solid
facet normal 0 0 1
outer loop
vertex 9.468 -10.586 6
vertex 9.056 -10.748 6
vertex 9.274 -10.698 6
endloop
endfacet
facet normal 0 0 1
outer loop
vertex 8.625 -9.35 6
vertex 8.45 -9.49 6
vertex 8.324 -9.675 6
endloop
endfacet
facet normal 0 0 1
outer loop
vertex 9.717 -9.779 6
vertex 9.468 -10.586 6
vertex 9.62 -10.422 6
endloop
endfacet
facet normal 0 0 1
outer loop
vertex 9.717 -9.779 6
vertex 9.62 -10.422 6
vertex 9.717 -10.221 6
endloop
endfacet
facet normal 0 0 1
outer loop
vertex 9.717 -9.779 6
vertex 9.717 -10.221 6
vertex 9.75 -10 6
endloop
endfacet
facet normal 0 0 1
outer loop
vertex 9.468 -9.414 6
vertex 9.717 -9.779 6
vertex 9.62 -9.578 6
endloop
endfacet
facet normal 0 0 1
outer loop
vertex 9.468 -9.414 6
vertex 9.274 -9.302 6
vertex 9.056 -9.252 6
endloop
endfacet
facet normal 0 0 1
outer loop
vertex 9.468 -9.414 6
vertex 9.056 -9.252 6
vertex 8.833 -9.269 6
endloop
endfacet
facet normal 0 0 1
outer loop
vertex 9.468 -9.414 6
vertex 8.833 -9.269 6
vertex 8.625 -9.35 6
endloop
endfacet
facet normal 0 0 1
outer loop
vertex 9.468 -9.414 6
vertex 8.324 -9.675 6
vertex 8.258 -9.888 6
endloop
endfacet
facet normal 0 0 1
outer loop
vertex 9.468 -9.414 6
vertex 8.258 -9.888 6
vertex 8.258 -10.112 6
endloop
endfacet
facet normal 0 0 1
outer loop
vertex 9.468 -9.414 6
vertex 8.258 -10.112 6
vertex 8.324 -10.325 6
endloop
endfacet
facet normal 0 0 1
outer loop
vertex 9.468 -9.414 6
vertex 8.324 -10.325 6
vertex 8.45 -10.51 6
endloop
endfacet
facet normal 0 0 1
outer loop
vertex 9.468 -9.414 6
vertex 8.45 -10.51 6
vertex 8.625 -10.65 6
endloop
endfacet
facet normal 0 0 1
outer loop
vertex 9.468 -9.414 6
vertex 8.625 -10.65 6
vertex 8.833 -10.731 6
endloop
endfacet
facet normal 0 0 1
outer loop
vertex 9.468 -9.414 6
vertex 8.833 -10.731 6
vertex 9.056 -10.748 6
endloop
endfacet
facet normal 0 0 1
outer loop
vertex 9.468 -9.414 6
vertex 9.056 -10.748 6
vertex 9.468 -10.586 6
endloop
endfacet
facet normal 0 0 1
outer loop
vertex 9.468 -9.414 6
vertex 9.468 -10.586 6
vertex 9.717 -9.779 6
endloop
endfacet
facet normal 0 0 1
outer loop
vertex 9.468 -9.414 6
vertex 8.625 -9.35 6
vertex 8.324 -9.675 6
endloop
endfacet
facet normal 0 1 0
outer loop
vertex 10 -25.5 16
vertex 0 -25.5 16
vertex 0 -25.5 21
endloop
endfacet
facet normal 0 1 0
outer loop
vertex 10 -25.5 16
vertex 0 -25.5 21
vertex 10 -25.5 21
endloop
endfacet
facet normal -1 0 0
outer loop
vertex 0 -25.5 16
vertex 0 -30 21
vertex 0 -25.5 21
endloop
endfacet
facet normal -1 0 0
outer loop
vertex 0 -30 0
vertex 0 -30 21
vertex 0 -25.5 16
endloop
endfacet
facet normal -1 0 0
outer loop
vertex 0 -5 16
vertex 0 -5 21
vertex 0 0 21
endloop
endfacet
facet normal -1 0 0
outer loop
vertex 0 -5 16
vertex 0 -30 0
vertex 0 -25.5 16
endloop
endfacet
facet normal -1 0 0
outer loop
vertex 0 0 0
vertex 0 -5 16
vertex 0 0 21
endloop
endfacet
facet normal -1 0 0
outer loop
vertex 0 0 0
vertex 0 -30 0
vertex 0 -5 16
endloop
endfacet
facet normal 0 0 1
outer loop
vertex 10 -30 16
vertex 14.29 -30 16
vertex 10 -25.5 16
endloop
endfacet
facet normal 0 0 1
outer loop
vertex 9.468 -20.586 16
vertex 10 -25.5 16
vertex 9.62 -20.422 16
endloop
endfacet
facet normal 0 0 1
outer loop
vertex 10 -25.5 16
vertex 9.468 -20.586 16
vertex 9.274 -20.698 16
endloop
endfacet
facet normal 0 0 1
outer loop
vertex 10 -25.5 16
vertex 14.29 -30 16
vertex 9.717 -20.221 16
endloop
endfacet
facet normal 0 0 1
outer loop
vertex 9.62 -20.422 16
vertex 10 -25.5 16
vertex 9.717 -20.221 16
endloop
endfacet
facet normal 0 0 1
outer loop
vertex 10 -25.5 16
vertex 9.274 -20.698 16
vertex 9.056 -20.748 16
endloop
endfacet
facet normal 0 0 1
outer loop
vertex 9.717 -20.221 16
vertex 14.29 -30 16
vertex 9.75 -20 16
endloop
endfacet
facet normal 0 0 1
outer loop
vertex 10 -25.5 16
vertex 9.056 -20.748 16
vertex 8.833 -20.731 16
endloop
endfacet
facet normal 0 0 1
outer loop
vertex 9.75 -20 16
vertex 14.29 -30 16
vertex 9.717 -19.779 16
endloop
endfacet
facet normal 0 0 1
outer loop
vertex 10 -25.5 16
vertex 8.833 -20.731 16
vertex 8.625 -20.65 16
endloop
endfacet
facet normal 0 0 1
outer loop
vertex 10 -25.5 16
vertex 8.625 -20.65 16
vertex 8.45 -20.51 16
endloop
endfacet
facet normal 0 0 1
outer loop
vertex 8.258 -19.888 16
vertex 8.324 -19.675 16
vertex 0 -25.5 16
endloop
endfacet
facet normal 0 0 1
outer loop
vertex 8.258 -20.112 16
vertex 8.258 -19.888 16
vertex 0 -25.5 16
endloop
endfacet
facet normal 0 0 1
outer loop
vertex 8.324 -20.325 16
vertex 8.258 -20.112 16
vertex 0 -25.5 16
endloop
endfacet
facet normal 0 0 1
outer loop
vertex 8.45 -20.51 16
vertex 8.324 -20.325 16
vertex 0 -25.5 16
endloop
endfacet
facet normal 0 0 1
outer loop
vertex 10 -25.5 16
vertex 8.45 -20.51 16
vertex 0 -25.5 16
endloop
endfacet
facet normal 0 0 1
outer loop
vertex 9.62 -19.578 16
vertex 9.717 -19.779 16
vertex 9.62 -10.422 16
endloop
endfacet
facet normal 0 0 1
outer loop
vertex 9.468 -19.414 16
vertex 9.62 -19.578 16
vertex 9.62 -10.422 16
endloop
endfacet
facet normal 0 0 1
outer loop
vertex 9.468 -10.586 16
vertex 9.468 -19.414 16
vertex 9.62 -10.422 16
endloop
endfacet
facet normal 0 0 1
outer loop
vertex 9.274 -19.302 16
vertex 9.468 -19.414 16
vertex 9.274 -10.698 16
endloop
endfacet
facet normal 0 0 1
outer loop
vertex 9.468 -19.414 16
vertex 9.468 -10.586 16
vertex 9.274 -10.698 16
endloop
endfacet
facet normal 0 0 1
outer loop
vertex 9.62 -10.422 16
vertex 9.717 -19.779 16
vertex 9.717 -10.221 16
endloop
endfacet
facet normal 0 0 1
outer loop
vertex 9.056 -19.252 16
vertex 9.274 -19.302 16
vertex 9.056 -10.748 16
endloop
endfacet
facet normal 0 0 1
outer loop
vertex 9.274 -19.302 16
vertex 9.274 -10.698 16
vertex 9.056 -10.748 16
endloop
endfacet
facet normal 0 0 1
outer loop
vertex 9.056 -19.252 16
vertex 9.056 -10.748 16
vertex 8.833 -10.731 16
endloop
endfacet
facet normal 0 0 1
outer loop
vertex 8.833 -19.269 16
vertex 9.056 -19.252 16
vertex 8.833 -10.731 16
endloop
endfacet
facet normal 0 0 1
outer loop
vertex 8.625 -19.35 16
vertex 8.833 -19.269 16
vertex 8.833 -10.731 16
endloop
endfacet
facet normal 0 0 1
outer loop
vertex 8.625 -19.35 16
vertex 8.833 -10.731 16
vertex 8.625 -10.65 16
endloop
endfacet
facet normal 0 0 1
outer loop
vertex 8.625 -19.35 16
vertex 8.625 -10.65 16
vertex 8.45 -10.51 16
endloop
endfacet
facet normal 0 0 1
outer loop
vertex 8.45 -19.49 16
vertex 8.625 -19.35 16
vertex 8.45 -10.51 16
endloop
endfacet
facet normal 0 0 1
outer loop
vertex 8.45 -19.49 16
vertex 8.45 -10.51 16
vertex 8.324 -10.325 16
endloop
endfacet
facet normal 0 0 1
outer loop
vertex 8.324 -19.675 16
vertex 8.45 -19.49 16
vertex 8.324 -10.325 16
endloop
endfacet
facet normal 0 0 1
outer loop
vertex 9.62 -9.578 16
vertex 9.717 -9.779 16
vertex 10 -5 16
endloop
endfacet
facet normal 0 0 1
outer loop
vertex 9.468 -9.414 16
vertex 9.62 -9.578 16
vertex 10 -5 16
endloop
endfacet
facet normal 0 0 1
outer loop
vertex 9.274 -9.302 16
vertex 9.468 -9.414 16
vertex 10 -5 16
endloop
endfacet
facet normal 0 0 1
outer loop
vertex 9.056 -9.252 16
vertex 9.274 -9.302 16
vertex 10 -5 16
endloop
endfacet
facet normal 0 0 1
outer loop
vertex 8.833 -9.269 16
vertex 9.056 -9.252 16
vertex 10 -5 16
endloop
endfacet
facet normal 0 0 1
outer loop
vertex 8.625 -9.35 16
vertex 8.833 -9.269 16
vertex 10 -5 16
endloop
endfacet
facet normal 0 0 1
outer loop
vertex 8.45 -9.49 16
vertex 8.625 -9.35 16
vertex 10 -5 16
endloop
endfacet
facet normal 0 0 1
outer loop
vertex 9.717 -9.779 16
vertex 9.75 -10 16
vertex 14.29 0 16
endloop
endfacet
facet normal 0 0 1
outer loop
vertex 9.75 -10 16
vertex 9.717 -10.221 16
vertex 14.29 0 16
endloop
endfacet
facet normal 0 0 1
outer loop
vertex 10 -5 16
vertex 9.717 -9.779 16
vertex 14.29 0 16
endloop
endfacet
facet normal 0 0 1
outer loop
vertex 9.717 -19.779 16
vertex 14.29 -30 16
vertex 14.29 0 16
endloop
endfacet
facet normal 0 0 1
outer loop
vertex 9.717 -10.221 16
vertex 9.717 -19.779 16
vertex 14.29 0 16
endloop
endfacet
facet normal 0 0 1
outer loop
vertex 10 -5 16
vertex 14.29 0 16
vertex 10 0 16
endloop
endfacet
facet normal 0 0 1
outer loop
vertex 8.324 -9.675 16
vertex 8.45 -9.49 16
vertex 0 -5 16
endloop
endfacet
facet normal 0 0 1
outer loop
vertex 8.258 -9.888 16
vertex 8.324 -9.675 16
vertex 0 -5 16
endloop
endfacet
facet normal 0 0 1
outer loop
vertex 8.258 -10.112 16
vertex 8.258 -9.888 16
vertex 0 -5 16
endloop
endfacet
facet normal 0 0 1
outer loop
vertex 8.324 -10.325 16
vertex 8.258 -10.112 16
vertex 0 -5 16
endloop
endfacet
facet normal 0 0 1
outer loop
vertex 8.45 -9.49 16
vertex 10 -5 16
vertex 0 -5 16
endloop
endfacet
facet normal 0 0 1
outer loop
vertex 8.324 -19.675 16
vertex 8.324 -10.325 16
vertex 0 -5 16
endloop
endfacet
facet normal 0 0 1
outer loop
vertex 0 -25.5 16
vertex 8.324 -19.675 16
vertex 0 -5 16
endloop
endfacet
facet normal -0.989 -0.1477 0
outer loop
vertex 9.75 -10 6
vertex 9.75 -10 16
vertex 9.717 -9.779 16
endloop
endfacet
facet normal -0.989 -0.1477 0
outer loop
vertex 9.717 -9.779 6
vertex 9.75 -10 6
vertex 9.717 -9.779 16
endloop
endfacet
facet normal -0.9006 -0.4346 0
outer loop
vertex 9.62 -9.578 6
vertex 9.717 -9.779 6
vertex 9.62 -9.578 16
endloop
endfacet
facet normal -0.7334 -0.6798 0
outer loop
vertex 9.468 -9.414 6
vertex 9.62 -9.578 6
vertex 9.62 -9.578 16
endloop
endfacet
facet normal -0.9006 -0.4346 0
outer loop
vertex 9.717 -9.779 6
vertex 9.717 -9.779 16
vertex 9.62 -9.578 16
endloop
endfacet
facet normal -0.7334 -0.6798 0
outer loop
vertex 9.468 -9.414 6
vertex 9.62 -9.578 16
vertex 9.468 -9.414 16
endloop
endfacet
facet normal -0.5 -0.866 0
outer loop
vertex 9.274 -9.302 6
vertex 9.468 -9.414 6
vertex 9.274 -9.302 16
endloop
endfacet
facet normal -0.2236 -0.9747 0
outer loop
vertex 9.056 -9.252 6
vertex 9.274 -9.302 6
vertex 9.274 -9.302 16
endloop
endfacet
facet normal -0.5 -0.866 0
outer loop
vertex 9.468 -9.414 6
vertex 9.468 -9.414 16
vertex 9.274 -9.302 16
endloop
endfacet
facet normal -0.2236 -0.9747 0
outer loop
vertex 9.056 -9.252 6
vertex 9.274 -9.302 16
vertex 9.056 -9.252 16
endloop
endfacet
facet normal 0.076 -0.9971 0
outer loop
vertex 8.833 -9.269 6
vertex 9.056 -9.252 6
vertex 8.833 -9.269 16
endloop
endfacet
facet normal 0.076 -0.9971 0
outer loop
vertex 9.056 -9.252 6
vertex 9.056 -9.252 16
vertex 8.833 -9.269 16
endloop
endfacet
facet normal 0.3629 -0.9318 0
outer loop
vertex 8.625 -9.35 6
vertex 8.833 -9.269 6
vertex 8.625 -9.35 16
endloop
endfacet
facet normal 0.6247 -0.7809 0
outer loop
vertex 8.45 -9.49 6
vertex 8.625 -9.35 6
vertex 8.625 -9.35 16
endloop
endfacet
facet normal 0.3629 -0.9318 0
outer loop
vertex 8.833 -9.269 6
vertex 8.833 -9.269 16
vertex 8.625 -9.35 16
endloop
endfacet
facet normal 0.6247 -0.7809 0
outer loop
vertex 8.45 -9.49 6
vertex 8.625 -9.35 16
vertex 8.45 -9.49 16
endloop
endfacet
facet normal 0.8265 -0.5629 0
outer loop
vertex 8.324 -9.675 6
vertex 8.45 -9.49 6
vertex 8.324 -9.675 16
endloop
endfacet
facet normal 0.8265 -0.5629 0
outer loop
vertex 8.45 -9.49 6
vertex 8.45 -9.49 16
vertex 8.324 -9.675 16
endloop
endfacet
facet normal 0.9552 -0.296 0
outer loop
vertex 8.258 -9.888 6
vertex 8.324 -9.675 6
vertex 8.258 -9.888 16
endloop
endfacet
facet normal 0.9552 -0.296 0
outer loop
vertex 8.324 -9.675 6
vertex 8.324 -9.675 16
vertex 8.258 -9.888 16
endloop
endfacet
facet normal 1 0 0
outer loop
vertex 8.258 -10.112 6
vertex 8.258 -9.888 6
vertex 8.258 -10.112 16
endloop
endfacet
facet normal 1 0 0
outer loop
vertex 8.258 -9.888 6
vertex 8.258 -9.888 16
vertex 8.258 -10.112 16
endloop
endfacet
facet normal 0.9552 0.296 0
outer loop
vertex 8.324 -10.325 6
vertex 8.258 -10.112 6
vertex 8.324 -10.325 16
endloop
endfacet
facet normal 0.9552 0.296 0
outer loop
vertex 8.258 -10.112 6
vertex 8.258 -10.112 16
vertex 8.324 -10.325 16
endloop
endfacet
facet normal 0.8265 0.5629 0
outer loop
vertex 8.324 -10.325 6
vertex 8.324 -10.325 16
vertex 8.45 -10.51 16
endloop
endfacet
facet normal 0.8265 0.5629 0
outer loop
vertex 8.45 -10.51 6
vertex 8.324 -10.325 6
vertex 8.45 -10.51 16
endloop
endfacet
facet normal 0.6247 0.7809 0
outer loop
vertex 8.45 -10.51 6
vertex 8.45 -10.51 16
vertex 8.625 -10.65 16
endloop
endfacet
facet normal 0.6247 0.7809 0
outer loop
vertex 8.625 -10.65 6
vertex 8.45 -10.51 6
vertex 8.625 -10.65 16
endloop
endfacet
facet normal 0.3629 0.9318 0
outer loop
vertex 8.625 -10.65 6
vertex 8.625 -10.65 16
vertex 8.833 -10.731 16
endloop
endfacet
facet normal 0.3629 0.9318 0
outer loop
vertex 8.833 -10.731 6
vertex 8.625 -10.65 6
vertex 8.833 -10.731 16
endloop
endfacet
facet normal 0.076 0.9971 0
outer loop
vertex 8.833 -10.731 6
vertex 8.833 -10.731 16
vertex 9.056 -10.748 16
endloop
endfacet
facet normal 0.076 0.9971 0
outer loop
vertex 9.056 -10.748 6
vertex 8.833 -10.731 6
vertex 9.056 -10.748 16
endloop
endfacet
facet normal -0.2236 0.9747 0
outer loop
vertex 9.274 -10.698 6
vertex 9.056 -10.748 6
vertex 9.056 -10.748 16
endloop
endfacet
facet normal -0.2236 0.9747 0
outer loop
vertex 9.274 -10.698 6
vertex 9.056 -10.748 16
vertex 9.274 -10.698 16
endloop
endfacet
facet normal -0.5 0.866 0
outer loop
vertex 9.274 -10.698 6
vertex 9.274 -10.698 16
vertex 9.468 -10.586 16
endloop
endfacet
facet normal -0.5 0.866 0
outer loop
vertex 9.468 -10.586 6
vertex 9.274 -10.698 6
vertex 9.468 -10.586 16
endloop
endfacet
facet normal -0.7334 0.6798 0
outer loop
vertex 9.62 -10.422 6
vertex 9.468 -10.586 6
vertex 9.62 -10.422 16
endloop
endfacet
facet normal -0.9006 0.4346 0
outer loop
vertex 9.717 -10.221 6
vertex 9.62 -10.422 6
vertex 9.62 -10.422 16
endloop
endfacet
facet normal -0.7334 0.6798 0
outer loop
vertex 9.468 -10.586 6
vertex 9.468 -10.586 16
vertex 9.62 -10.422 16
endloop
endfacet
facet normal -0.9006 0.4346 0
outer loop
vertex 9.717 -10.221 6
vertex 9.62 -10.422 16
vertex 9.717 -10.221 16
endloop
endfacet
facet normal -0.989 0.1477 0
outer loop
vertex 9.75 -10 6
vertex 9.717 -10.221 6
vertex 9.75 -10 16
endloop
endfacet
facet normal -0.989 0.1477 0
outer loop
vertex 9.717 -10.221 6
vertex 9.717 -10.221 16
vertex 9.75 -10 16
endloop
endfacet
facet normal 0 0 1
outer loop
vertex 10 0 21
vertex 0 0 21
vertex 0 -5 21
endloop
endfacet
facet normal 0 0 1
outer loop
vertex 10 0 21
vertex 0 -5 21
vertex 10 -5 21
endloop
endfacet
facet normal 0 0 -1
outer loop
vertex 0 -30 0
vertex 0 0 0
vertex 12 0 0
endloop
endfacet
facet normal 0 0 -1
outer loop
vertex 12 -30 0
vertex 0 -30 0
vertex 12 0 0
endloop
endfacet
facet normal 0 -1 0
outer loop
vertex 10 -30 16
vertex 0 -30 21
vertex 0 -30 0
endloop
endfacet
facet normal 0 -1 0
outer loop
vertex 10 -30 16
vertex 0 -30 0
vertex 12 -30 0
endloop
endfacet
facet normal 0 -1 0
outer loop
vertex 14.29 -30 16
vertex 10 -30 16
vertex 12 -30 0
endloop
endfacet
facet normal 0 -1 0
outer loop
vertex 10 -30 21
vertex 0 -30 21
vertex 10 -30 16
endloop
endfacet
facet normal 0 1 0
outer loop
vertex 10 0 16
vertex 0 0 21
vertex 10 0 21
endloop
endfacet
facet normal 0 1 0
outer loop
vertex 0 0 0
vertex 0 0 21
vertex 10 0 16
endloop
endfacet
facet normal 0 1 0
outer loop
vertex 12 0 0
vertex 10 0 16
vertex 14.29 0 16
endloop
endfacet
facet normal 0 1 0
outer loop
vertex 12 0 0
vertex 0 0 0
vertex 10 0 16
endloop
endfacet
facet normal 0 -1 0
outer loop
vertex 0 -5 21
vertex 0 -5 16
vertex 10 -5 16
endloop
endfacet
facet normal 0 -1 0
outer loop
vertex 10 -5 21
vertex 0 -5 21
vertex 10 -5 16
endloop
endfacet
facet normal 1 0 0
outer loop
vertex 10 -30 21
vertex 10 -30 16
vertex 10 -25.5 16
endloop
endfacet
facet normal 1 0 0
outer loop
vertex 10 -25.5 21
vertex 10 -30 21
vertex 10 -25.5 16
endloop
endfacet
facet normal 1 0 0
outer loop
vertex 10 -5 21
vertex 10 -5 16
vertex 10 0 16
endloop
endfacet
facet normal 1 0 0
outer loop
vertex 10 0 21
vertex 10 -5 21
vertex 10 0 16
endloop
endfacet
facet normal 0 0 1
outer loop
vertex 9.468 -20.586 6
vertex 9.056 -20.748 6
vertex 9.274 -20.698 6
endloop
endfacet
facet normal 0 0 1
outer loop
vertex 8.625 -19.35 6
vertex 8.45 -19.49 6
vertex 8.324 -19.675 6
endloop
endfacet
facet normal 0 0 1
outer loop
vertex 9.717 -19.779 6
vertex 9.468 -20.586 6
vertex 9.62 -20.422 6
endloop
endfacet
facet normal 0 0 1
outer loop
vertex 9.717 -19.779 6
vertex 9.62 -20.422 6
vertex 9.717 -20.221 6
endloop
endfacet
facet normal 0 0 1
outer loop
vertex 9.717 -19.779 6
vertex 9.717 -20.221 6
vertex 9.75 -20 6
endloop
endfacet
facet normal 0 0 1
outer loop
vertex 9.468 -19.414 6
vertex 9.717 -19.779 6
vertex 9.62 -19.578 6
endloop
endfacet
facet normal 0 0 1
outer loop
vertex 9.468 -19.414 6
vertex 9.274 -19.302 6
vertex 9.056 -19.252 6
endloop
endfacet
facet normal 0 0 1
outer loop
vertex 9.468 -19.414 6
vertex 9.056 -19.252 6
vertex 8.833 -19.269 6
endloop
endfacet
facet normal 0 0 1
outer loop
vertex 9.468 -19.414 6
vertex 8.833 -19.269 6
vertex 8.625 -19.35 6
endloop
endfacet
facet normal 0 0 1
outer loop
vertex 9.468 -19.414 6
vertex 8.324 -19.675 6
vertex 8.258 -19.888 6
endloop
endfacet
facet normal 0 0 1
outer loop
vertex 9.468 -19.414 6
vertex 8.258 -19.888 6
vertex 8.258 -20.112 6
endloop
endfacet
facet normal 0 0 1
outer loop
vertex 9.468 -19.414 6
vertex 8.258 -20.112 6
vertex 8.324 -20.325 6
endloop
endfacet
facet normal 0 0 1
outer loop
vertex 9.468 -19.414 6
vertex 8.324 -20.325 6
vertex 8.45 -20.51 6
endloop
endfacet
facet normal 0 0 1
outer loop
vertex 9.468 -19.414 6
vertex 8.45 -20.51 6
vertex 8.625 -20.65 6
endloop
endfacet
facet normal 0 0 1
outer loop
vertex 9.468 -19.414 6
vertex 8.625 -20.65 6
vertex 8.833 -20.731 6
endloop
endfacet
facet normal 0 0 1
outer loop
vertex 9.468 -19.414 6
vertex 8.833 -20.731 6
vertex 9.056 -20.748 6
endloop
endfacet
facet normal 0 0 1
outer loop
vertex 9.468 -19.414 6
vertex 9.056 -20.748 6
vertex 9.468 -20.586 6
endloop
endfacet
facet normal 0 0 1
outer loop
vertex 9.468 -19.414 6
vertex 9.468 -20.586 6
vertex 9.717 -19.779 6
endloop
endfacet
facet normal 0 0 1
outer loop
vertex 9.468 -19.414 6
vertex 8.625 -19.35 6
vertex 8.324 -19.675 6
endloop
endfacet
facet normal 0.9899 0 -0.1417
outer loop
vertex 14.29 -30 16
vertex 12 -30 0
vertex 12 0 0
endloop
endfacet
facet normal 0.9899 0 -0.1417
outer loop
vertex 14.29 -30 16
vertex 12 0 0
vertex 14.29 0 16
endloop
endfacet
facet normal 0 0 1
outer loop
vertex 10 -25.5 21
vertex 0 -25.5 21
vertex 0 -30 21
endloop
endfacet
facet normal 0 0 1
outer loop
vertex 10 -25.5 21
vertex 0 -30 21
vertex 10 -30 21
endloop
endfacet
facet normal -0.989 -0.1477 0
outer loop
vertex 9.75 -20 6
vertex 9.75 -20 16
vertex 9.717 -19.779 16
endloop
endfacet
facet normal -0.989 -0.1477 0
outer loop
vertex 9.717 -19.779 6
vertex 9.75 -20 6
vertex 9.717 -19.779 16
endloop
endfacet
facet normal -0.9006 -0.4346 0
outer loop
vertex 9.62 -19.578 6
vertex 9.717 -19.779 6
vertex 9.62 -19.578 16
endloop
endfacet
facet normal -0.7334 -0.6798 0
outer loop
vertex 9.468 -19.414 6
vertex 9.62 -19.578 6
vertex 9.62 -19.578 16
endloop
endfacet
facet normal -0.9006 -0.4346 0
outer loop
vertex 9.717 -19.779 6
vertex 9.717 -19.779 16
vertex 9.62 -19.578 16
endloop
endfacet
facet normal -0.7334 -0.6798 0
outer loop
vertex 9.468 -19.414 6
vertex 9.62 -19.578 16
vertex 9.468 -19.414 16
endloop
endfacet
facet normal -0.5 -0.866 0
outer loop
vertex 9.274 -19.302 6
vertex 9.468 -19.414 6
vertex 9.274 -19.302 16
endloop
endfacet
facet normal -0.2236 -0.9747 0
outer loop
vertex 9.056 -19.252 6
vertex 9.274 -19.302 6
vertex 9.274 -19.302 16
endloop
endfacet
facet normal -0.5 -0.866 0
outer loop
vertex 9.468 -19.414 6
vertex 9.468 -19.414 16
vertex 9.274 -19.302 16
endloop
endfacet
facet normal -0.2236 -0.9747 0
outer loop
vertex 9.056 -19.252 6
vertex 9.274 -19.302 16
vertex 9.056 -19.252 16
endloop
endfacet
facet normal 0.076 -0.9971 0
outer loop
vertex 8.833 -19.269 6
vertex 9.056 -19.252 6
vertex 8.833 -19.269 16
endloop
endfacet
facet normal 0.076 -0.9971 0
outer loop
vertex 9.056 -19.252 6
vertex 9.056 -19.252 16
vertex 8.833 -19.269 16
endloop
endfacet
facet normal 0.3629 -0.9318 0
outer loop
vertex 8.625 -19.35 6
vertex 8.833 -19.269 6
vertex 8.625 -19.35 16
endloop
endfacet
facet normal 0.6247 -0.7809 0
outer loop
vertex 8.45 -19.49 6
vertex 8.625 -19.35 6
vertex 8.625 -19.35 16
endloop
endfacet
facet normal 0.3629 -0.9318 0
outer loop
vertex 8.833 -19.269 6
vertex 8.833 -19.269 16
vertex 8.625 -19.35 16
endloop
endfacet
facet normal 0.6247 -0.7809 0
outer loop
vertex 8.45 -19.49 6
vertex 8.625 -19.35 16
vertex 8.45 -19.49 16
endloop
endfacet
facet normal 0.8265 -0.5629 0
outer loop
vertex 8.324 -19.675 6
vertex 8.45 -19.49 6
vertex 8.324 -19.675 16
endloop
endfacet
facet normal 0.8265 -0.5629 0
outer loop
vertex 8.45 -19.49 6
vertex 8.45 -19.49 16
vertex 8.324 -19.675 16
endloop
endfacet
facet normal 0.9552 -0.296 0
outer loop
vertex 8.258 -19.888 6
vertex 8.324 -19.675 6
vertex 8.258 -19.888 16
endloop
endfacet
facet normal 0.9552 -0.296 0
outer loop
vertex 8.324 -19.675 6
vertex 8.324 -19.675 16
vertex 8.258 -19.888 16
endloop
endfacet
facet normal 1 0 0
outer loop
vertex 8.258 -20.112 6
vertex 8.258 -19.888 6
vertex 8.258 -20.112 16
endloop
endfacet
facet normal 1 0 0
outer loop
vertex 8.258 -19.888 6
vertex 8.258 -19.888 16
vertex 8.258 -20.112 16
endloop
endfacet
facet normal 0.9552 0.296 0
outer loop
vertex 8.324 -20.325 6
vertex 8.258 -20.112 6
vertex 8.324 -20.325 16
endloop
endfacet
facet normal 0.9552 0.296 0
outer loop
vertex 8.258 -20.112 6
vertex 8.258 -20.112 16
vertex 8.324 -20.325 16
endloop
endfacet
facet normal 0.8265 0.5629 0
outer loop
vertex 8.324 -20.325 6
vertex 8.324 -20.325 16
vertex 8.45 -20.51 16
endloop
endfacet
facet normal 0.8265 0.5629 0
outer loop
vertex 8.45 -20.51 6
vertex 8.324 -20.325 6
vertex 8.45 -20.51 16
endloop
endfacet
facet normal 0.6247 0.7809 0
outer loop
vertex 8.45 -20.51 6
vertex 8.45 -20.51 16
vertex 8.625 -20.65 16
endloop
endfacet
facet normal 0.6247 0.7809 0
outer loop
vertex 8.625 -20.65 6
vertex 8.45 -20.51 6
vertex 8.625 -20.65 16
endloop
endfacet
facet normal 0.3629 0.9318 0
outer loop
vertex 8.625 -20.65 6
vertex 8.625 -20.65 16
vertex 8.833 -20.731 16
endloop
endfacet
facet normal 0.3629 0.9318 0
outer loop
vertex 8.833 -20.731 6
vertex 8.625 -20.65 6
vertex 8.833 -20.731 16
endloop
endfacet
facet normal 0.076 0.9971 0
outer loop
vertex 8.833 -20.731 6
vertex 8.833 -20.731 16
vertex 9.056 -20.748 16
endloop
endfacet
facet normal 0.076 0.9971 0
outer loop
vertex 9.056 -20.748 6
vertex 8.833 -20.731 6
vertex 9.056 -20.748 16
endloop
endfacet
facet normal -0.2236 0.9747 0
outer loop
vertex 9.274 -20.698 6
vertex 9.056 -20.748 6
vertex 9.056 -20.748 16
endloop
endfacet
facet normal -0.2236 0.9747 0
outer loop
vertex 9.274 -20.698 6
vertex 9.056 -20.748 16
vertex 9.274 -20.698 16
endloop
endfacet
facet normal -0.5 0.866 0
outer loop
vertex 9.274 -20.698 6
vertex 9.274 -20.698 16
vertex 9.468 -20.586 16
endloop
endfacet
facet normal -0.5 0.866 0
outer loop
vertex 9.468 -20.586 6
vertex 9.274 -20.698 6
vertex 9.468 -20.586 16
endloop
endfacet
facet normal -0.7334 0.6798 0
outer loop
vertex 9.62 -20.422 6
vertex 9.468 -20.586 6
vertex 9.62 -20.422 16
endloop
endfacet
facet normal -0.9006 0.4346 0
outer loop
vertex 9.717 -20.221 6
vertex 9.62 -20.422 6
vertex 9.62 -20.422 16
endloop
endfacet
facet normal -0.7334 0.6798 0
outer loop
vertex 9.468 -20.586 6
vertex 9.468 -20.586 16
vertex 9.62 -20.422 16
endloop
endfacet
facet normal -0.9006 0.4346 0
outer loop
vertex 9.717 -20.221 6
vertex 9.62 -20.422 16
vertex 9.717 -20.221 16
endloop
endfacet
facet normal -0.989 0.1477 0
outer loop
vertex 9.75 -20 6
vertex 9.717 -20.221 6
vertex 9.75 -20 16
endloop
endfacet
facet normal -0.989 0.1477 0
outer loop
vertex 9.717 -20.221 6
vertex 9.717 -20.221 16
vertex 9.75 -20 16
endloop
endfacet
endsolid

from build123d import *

# Parameters (mm, degrees)
F1_DEPTH = 30
F2_R     = 0.75
F3_DEPTH = 10
F4_W     = 10
F4_H     = 5
F4_H_2   = 4.5
F5_DEPTH = 5


# Not quite as in the source:
# - a feature names something its author has since deleted; it is built from what else it names


with BuildPart() as f1:
    # F0 (on Front) → F1 (new body)
    with BuildSketch(Plane.XZ):
        Polygon((0, 16), (0, 0), (12, 0), (14.29, 16), align=None)
    extrude(amount=F1_DEPTH)

    # F2 (on face) → F3 (cut)
    with BuildSketch(Plane.XY.offset(16)):
        with Locations((9, -10)):
            Circle(F2_R)
        with Locations((9, -20)):
            Circle(F2_R)
    extrude(amount=-F3_DEPTH, mode=Mode.SUBTRACT)

    # F4 (on face) → F5 (join)
    with BuildSketch(Plane.XY.offset(16)):
        with Locations((5, -2.5)):
            Rectangle(F4_W, F4_H)
        with Locations((5, -27.75)):
            Rectangle(F4_W, F4_H_2)
    extrude(amount=F5_DEPTH)


solid = f1.part
